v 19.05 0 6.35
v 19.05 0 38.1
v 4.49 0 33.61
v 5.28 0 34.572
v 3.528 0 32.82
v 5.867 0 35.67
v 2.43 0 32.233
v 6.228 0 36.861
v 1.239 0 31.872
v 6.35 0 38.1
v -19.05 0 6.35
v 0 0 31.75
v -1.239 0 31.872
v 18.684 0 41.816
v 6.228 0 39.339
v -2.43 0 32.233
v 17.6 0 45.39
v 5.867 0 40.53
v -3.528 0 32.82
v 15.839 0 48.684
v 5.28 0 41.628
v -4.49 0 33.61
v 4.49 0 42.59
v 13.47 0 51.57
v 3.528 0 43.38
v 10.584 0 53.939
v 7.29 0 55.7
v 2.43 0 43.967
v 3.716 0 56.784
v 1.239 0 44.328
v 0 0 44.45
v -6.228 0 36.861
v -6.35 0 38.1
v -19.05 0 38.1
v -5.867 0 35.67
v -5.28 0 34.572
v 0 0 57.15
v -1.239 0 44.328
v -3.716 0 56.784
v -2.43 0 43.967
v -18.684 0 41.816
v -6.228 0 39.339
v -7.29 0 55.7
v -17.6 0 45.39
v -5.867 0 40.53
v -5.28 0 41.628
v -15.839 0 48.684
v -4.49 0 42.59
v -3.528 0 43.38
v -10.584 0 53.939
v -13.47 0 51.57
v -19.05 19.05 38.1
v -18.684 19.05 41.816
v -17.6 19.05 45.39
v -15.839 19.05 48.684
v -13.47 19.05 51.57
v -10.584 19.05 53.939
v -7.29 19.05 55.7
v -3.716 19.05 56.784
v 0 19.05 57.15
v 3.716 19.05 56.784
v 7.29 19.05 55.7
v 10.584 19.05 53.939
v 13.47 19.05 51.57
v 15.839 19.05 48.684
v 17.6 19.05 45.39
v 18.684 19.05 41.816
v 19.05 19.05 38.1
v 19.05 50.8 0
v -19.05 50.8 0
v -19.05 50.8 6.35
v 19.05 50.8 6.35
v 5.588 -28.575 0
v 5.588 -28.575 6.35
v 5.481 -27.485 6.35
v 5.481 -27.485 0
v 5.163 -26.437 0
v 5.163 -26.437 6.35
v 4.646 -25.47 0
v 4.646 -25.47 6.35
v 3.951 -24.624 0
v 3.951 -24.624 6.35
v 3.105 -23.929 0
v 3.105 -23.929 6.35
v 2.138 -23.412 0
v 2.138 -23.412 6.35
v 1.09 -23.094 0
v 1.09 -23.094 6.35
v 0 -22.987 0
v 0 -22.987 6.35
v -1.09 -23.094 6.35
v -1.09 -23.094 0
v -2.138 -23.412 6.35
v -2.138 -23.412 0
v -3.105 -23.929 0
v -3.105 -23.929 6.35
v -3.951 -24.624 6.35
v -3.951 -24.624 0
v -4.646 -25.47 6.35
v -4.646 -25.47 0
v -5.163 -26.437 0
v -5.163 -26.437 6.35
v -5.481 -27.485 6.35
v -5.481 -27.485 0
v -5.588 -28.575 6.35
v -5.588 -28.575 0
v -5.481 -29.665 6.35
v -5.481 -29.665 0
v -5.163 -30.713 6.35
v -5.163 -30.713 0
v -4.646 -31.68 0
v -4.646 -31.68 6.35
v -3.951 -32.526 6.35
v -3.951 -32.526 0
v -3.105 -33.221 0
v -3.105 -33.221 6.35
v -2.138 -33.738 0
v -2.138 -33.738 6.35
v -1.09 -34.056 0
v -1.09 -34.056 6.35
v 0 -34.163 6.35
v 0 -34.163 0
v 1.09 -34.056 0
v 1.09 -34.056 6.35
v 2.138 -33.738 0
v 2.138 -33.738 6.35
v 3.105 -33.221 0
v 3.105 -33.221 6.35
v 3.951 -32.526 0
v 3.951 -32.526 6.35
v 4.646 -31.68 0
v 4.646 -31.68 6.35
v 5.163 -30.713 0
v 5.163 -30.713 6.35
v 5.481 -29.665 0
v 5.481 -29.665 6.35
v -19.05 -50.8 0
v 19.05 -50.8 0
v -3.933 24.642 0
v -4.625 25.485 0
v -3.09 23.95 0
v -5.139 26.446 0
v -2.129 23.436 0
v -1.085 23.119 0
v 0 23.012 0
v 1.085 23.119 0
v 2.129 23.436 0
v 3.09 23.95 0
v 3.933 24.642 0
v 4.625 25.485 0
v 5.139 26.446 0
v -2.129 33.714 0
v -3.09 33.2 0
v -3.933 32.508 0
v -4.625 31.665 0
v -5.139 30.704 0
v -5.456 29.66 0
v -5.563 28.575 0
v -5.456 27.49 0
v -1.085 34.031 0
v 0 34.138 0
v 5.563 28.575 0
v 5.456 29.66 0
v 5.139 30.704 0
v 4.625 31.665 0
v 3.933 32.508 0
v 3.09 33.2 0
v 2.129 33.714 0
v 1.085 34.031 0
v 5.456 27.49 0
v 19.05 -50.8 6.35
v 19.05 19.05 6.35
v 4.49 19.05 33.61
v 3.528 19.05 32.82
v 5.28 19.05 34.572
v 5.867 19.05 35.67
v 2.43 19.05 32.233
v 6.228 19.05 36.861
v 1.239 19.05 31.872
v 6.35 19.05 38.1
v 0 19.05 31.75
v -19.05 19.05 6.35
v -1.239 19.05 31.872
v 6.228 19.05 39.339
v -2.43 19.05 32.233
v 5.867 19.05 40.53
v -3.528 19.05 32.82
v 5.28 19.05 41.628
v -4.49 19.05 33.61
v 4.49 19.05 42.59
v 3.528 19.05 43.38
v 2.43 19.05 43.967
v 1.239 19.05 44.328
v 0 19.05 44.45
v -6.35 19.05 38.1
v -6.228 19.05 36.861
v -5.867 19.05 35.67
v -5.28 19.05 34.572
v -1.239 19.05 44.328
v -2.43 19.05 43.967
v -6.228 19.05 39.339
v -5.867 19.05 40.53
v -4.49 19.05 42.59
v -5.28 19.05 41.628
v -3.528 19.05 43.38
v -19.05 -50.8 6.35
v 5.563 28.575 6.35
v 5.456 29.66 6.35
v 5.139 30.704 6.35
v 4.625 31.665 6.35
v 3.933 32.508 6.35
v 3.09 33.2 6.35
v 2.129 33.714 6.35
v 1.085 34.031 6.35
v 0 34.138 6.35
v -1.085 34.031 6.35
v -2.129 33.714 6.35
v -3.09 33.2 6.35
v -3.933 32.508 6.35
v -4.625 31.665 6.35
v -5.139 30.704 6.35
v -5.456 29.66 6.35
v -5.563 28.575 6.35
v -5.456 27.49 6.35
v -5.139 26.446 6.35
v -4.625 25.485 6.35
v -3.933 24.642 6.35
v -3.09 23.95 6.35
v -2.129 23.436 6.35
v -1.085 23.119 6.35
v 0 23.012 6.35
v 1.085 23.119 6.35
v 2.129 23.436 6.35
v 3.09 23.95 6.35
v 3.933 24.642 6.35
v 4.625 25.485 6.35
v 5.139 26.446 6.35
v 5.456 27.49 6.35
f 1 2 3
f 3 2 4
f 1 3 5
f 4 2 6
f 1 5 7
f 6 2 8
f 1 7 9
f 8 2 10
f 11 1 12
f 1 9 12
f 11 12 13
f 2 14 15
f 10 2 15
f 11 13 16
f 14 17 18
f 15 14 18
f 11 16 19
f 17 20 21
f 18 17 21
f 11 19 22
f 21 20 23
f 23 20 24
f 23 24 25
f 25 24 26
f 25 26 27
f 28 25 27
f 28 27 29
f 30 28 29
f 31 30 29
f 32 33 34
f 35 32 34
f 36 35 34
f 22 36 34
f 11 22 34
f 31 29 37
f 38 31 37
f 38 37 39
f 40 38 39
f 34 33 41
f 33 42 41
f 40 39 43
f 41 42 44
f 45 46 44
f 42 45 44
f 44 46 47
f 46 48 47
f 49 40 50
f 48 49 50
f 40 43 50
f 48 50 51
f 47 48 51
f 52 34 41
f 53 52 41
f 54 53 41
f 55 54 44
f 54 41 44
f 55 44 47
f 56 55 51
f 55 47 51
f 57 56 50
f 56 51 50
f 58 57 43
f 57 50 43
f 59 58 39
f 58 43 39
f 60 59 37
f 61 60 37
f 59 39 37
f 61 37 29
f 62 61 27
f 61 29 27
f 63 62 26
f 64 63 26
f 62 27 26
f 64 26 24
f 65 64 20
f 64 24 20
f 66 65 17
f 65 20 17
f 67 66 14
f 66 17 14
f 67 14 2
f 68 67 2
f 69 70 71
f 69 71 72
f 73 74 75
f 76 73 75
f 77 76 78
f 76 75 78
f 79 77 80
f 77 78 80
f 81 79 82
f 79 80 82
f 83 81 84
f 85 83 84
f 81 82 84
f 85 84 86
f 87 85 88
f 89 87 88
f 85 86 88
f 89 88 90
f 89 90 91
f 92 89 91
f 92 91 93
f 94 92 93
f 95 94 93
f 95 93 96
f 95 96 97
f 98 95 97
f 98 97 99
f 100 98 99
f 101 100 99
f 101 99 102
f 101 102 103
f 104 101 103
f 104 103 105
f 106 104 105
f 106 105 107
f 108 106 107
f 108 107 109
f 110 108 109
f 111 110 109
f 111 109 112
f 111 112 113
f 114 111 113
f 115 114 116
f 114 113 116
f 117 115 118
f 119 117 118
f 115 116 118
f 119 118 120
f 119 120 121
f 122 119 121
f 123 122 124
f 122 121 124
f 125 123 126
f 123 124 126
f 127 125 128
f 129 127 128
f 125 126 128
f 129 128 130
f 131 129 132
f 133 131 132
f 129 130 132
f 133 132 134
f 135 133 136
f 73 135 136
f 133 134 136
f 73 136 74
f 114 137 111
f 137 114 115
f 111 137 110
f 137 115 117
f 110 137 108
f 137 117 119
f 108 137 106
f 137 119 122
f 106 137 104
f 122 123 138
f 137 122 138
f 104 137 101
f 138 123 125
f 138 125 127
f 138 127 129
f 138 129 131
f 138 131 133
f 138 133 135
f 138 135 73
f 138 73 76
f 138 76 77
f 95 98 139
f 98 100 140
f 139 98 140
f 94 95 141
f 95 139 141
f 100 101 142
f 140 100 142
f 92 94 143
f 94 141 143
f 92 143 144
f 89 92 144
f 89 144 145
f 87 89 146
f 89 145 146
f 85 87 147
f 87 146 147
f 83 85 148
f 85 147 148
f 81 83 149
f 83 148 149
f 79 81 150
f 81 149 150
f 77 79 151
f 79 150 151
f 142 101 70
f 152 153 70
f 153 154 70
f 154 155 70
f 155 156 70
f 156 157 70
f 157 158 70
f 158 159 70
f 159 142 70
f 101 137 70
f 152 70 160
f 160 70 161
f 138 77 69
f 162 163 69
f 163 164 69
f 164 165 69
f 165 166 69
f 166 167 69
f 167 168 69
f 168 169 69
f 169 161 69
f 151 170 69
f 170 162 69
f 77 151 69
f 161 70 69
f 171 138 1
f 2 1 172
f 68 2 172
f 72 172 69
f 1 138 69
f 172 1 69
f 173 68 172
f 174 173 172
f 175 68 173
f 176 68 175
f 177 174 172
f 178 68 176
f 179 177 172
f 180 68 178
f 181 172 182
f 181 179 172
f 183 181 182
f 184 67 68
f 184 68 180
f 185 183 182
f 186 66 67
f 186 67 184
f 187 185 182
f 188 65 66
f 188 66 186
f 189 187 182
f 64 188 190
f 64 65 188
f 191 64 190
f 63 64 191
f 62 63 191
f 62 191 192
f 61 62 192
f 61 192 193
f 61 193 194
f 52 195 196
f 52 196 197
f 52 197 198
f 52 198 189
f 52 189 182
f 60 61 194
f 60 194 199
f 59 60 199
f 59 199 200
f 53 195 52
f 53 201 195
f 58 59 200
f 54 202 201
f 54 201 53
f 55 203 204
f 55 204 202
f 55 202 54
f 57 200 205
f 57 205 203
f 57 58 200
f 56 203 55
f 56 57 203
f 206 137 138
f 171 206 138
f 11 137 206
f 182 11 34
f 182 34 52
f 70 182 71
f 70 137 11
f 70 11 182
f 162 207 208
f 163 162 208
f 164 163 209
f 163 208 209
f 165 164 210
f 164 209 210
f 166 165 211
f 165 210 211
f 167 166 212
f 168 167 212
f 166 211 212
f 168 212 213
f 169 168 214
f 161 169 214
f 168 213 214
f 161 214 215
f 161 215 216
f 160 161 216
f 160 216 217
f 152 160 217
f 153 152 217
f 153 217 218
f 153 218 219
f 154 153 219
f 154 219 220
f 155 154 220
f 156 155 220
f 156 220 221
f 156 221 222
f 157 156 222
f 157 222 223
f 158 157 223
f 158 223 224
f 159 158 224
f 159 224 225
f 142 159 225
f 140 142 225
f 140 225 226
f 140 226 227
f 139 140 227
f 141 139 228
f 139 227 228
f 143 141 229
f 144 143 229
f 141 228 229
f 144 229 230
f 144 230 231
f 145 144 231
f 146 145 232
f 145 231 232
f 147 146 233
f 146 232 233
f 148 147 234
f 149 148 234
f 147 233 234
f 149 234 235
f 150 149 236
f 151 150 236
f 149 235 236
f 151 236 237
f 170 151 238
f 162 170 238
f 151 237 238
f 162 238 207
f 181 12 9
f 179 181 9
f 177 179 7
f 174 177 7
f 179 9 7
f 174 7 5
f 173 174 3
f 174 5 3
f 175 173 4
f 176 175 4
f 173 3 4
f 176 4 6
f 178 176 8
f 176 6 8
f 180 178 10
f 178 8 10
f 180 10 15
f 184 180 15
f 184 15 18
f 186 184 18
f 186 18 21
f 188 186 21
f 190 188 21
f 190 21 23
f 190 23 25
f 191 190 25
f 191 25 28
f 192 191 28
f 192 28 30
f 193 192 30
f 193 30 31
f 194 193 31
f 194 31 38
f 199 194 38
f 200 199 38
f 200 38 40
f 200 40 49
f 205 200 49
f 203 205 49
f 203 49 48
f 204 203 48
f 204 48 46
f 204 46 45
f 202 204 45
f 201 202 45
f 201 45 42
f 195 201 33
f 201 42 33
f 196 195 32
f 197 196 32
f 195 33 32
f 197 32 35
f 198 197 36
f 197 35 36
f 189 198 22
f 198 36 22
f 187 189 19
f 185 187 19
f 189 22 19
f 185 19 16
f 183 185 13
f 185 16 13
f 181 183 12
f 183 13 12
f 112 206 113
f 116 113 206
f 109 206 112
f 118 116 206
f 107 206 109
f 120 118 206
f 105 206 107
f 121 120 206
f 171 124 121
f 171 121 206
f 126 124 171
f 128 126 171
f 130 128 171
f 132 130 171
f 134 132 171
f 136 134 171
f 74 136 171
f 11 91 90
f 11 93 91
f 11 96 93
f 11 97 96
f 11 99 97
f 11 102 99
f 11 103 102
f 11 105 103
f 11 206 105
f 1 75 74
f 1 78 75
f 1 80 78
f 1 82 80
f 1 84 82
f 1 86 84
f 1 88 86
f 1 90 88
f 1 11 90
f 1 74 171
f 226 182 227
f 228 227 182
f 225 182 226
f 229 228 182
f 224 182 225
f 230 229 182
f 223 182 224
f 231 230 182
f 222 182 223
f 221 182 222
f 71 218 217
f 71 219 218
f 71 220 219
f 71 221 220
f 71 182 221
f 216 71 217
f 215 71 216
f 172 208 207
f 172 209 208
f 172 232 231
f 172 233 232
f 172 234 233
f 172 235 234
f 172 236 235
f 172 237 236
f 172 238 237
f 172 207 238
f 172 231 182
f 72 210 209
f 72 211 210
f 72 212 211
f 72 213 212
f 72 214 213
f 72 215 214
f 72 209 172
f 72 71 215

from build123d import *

# Parameters (mm, degrees)
SKETCH1_W           = 38.1
SKETCH1_H           = 101.6
BOSS_EXTRUDE1_DEPTH = 6.35
SKETCH2_R           = 5.5626
SKETCH2_R_2         = 5.588
CUT_EXTRUDE1_DEPTH  = 55.624765446
SKETCH3_W           = 38.1
SKETCH3_H           = 19.05
BOSS_EXTRUDE2_DEPTH = 31.75
BOSS_EXTRUDE3_DEPTH = 19.05
SKETCH5_R           = 6.35
CUT_EXTRUDE2_DEPTH  = 79.801427652


with BuildPart() as part:
    # Sketch1 → Boss-Extrude1 (new body)
    with BuildSketch(Plane.XY):
        Rectangle(SKETCH1_W, SKETCH1_H)
    extrude(amount=BOSS_EXTRUDE1_DEPTH)

    # Sketch2 → Cut-Extrude1 (cut, through all)
    with BuildSketch(Plane.XY.offset(6.35)):
        with Locations((0, 28.575)):
            Circle(SKETCH2_R)
        with Locations((0, -28.575)):
            Circle(SKETCH2_R_2)
    extrude(amount=-CUT_EXTRUDE1_DEPTH, mode=Mode.SUBTRACT)

    # Sketch3 → Boss-Extrude2 (add)
    with BuildSketch(Plane.XY.offset(6.35)):
        with Locations((0, 9.525)):
            Rectangle(SKETCH3_W, SKETCH3_H)
    extrude(amount=BOSS_EXTRUDE2_DEPTH)

    # Sketch4 → Boss-Extrude3 (add)
    with BuildSketch(Plane.XZ):
        with BuildLine():
            Line((19.05, 38.1), (-19.05, 38.1))
            ThreePointArc((-19.05, 38.1), (0, 57.15), (19.05, 38.1))
        make_face()
    extrude(amount=-BOSS_EXTRUDE3_DEPTH)

    # Sketch5 → Cut-Extrude2 (cut, through all)
    with BuildSketch(Plane.XZ):
        with Locations(Location((0, 38.1, 0), (0, 0, 270))):
            Circle(SKETCH5_R)
    extrude(amount=-CUT_EXTRUDE2_DEPTH, mode=Mode.SUBTRACT)


solid = part.part
